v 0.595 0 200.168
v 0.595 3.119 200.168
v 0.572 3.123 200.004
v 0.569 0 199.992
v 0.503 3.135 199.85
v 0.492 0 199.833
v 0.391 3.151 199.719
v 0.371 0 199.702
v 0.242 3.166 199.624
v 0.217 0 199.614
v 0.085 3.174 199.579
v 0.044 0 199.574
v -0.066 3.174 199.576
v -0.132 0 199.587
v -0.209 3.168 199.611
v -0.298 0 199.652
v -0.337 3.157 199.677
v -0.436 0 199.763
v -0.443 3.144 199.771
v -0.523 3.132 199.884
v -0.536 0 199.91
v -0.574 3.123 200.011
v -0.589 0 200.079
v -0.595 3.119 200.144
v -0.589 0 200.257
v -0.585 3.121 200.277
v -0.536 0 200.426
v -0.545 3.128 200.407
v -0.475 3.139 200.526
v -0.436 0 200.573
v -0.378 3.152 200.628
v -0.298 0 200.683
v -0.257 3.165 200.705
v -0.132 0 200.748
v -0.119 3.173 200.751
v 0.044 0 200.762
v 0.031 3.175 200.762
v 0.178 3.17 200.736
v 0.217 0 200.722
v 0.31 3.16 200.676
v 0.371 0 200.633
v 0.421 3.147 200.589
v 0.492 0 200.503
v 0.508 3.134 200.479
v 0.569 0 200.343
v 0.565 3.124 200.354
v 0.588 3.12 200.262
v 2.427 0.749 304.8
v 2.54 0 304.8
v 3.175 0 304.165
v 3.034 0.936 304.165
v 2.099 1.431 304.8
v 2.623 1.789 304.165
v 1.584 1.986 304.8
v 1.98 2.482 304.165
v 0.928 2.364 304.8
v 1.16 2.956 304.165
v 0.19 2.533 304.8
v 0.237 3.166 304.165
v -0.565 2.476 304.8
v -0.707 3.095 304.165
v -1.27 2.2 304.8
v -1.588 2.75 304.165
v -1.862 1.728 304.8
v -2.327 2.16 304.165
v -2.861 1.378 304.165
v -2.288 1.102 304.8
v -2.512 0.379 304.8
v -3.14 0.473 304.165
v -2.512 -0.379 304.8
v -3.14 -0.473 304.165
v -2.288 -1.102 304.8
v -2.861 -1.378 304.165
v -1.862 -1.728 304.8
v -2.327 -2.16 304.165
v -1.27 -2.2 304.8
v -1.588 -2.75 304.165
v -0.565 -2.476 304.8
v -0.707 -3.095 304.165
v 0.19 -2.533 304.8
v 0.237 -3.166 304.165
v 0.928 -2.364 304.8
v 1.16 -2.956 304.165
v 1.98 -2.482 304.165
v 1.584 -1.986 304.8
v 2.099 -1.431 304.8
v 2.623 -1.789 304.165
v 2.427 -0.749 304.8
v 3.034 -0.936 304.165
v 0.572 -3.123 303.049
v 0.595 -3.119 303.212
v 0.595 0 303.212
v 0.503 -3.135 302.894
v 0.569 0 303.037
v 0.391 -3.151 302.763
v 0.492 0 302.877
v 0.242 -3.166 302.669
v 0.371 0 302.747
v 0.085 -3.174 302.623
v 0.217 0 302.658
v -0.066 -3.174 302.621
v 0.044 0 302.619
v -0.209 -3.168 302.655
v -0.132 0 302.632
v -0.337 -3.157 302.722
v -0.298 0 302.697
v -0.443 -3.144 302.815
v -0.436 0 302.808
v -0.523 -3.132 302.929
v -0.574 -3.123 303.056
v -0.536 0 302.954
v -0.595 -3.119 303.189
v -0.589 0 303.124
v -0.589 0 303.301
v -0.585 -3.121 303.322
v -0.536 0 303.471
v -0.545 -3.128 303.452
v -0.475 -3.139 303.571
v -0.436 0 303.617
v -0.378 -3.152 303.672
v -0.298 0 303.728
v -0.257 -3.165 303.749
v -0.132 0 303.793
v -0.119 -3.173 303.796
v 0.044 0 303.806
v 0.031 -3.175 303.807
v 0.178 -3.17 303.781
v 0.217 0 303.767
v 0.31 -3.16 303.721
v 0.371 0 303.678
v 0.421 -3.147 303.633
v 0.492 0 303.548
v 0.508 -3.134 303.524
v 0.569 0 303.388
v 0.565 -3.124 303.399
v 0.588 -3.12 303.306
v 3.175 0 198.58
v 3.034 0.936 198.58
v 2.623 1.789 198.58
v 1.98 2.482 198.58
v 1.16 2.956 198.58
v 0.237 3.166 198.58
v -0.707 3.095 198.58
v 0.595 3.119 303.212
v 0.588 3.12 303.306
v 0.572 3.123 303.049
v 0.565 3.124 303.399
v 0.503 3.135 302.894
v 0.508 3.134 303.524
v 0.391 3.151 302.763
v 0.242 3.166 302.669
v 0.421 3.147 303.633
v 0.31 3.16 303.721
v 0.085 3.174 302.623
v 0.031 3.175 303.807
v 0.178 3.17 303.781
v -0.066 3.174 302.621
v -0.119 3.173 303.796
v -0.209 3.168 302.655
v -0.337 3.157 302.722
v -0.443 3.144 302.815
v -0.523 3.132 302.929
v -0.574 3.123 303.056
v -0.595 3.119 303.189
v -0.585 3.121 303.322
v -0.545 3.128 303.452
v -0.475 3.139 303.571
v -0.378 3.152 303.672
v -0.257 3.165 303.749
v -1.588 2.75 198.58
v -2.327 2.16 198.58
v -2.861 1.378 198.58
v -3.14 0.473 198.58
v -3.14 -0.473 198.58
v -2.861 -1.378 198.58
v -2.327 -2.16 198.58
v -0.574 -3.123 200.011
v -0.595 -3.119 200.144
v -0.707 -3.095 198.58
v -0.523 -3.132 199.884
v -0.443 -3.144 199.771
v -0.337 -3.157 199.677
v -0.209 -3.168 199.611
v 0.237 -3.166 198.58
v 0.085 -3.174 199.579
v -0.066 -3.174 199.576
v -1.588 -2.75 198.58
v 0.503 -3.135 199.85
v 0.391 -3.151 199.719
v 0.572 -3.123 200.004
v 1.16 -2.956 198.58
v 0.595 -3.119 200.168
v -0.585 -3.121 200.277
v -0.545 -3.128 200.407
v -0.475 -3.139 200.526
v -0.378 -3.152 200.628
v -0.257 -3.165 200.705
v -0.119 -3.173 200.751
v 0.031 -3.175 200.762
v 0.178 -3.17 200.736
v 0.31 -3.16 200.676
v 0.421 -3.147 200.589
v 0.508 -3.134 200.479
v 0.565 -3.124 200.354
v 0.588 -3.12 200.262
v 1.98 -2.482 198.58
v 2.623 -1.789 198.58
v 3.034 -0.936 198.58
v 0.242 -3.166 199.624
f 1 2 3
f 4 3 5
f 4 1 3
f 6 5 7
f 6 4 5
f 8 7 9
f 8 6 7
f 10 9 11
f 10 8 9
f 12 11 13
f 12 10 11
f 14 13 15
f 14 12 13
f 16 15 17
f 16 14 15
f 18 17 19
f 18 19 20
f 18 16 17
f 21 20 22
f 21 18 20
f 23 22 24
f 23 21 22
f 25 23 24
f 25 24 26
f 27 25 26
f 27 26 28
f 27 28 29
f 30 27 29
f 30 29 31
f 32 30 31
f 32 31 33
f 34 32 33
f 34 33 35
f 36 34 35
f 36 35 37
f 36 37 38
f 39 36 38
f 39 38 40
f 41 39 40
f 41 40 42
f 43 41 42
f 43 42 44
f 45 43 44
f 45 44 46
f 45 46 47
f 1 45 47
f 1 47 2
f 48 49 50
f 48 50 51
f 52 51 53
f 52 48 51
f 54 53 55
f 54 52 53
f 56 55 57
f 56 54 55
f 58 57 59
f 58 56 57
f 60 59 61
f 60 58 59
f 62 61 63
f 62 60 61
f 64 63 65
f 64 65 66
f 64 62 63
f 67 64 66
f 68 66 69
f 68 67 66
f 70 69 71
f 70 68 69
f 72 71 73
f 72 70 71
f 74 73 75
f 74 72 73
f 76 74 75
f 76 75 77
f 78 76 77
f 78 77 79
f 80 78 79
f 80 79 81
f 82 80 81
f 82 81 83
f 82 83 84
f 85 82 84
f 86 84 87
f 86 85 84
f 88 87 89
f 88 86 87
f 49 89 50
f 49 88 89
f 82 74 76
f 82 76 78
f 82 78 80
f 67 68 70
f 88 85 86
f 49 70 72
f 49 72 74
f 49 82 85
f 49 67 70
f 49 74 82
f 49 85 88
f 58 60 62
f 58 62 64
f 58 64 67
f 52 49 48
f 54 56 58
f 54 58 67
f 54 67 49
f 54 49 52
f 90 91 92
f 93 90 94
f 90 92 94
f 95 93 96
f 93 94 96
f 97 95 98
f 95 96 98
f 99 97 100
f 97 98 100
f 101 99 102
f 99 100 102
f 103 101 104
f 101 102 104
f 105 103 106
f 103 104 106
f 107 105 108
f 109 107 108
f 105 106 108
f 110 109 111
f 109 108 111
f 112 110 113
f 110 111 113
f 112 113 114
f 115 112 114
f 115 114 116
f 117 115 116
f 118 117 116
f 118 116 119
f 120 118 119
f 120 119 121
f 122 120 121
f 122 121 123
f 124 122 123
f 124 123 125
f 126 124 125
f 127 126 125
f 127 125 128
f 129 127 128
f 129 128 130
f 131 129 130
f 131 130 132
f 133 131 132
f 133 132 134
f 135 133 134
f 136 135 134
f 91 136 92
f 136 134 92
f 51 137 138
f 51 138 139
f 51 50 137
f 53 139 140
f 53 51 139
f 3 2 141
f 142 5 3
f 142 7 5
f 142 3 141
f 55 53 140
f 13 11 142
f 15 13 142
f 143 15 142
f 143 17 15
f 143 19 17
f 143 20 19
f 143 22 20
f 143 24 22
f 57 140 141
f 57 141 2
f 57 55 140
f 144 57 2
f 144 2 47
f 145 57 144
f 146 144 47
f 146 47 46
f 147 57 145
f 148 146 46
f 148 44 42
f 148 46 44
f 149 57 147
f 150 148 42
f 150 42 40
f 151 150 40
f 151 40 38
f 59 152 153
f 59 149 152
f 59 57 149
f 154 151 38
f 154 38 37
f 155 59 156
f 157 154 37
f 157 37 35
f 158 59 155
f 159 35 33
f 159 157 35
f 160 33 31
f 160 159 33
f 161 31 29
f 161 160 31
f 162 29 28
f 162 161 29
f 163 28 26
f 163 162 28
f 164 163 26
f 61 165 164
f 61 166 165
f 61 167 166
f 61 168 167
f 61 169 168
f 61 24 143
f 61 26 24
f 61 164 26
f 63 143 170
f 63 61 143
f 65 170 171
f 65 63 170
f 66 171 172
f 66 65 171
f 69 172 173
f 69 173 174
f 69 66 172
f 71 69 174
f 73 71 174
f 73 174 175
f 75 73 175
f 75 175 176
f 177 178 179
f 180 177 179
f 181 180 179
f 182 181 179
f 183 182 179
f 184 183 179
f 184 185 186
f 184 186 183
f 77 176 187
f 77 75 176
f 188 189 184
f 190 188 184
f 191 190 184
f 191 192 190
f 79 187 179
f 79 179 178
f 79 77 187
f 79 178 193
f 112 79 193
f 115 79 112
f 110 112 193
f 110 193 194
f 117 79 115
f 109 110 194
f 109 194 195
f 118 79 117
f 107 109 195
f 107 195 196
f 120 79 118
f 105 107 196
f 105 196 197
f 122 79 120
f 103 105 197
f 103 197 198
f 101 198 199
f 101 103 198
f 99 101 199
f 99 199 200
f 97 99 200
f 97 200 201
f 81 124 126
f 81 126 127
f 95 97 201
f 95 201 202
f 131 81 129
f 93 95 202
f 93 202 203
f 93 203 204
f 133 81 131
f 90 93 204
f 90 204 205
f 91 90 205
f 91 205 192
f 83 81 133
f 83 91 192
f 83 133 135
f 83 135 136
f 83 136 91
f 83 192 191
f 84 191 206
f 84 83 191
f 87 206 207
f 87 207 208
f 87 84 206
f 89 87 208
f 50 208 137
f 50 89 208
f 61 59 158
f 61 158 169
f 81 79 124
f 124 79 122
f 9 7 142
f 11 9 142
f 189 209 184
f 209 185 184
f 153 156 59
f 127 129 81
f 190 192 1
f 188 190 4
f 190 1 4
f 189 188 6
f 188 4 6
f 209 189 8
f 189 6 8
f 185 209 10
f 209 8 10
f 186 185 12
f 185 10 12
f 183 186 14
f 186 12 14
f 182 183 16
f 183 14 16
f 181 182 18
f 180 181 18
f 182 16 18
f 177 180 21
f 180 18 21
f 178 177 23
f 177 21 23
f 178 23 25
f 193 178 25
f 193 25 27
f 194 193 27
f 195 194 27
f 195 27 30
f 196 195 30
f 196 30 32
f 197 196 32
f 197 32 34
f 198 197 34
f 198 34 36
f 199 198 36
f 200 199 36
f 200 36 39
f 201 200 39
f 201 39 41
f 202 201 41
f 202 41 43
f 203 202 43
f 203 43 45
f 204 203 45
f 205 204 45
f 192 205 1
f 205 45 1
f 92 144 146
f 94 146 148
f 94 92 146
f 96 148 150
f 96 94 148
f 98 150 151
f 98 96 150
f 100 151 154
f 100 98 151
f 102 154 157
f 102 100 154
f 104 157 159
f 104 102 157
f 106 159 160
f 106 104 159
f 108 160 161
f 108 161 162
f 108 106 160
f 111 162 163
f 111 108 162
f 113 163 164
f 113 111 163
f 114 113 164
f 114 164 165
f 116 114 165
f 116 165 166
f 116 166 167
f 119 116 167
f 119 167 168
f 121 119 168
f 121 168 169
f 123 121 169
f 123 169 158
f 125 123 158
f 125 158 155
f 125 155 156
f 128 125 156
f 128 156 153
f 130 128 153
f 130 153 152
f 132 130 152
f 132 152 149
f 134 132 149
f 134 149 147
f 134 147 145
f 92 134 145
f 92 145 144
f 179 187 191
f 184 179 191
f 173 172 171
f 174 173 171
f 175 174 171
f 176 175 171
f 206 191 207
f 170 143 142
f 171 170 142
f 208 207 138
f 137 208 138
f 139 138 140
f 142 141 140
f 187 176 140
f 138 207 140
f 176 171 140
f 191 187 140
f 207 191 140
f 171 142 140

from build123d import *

# Parameters (mm, degrees)
SKETCH3_R               = 3.175
BOSS_EXTRUDE1_DEPTH     = 304.8
CHAMFER1_SIZE           = 0.635
CUT_EXTRUDE1_START      = -106.219625
SKETCH4_R               = 3.175
CUT_EXTRUDE1_DEPTH      = 504.380375
SKETCH5_R               = 0.5953125
CUT_EXTRUDE2_DEPTH      = 4.175
CUT_EXTRUDE2_DEPTH_BACK = 4.175


with BuildPart() as part:
    # Sketch3 → Boss-Extrude1 (new body, symmetric)
    with BuildSketch(Plane.XY):
        Circle(SKETCH3_R)
    extrude(amount=BOSS_EXTRUDE1_DEPTH, both=True)

    # Chamfer1
    chamfer1_edges = [part.edges().sort_by_distance(p)[0] for p in [
        (-3.175, 0, -304.8),
        (-3.175, 0, 304.8),
    ]]
    chamfer(chamfer1_edges, length=CHAMFER1_SIZE)

    # Sketch4 → Cut-Extrude1 (cut, through all)
    with BuildSketch(Plane.XY.offset(304.8).offset(CUT_EXTRUDE1_START)):
        Circle(SKETCH4_R)
    extrude(amount=-CUT_EXTRUDE1_DEPTH, mode=Mode.SUBTRACT)

    # Sketch5 → Cut-Extrude2 (cut, two sides)
    with BuildSketch(Plane(origin=(0, 0, 0), x_dir=(1, 0, 0), z_dir=(0, 1, 0))) as cut_extrude2_sk:
        with Locations((0, -200.167875)):
            Circle(SKETCH5_R)
        with Locations((0, -303.2125)):
            Circle(SKETCH5_R)
    extrude(amount=CUT_EXTRUDE2_DEPTH, mode=Mode.SUBTRACT)
    extrude(cut_extrude2_sk.sketch, amount=-CUT_EXTRUDE2_DEPTH_BACK, mode=Mode.SUBTRACT)


solid = part.part
